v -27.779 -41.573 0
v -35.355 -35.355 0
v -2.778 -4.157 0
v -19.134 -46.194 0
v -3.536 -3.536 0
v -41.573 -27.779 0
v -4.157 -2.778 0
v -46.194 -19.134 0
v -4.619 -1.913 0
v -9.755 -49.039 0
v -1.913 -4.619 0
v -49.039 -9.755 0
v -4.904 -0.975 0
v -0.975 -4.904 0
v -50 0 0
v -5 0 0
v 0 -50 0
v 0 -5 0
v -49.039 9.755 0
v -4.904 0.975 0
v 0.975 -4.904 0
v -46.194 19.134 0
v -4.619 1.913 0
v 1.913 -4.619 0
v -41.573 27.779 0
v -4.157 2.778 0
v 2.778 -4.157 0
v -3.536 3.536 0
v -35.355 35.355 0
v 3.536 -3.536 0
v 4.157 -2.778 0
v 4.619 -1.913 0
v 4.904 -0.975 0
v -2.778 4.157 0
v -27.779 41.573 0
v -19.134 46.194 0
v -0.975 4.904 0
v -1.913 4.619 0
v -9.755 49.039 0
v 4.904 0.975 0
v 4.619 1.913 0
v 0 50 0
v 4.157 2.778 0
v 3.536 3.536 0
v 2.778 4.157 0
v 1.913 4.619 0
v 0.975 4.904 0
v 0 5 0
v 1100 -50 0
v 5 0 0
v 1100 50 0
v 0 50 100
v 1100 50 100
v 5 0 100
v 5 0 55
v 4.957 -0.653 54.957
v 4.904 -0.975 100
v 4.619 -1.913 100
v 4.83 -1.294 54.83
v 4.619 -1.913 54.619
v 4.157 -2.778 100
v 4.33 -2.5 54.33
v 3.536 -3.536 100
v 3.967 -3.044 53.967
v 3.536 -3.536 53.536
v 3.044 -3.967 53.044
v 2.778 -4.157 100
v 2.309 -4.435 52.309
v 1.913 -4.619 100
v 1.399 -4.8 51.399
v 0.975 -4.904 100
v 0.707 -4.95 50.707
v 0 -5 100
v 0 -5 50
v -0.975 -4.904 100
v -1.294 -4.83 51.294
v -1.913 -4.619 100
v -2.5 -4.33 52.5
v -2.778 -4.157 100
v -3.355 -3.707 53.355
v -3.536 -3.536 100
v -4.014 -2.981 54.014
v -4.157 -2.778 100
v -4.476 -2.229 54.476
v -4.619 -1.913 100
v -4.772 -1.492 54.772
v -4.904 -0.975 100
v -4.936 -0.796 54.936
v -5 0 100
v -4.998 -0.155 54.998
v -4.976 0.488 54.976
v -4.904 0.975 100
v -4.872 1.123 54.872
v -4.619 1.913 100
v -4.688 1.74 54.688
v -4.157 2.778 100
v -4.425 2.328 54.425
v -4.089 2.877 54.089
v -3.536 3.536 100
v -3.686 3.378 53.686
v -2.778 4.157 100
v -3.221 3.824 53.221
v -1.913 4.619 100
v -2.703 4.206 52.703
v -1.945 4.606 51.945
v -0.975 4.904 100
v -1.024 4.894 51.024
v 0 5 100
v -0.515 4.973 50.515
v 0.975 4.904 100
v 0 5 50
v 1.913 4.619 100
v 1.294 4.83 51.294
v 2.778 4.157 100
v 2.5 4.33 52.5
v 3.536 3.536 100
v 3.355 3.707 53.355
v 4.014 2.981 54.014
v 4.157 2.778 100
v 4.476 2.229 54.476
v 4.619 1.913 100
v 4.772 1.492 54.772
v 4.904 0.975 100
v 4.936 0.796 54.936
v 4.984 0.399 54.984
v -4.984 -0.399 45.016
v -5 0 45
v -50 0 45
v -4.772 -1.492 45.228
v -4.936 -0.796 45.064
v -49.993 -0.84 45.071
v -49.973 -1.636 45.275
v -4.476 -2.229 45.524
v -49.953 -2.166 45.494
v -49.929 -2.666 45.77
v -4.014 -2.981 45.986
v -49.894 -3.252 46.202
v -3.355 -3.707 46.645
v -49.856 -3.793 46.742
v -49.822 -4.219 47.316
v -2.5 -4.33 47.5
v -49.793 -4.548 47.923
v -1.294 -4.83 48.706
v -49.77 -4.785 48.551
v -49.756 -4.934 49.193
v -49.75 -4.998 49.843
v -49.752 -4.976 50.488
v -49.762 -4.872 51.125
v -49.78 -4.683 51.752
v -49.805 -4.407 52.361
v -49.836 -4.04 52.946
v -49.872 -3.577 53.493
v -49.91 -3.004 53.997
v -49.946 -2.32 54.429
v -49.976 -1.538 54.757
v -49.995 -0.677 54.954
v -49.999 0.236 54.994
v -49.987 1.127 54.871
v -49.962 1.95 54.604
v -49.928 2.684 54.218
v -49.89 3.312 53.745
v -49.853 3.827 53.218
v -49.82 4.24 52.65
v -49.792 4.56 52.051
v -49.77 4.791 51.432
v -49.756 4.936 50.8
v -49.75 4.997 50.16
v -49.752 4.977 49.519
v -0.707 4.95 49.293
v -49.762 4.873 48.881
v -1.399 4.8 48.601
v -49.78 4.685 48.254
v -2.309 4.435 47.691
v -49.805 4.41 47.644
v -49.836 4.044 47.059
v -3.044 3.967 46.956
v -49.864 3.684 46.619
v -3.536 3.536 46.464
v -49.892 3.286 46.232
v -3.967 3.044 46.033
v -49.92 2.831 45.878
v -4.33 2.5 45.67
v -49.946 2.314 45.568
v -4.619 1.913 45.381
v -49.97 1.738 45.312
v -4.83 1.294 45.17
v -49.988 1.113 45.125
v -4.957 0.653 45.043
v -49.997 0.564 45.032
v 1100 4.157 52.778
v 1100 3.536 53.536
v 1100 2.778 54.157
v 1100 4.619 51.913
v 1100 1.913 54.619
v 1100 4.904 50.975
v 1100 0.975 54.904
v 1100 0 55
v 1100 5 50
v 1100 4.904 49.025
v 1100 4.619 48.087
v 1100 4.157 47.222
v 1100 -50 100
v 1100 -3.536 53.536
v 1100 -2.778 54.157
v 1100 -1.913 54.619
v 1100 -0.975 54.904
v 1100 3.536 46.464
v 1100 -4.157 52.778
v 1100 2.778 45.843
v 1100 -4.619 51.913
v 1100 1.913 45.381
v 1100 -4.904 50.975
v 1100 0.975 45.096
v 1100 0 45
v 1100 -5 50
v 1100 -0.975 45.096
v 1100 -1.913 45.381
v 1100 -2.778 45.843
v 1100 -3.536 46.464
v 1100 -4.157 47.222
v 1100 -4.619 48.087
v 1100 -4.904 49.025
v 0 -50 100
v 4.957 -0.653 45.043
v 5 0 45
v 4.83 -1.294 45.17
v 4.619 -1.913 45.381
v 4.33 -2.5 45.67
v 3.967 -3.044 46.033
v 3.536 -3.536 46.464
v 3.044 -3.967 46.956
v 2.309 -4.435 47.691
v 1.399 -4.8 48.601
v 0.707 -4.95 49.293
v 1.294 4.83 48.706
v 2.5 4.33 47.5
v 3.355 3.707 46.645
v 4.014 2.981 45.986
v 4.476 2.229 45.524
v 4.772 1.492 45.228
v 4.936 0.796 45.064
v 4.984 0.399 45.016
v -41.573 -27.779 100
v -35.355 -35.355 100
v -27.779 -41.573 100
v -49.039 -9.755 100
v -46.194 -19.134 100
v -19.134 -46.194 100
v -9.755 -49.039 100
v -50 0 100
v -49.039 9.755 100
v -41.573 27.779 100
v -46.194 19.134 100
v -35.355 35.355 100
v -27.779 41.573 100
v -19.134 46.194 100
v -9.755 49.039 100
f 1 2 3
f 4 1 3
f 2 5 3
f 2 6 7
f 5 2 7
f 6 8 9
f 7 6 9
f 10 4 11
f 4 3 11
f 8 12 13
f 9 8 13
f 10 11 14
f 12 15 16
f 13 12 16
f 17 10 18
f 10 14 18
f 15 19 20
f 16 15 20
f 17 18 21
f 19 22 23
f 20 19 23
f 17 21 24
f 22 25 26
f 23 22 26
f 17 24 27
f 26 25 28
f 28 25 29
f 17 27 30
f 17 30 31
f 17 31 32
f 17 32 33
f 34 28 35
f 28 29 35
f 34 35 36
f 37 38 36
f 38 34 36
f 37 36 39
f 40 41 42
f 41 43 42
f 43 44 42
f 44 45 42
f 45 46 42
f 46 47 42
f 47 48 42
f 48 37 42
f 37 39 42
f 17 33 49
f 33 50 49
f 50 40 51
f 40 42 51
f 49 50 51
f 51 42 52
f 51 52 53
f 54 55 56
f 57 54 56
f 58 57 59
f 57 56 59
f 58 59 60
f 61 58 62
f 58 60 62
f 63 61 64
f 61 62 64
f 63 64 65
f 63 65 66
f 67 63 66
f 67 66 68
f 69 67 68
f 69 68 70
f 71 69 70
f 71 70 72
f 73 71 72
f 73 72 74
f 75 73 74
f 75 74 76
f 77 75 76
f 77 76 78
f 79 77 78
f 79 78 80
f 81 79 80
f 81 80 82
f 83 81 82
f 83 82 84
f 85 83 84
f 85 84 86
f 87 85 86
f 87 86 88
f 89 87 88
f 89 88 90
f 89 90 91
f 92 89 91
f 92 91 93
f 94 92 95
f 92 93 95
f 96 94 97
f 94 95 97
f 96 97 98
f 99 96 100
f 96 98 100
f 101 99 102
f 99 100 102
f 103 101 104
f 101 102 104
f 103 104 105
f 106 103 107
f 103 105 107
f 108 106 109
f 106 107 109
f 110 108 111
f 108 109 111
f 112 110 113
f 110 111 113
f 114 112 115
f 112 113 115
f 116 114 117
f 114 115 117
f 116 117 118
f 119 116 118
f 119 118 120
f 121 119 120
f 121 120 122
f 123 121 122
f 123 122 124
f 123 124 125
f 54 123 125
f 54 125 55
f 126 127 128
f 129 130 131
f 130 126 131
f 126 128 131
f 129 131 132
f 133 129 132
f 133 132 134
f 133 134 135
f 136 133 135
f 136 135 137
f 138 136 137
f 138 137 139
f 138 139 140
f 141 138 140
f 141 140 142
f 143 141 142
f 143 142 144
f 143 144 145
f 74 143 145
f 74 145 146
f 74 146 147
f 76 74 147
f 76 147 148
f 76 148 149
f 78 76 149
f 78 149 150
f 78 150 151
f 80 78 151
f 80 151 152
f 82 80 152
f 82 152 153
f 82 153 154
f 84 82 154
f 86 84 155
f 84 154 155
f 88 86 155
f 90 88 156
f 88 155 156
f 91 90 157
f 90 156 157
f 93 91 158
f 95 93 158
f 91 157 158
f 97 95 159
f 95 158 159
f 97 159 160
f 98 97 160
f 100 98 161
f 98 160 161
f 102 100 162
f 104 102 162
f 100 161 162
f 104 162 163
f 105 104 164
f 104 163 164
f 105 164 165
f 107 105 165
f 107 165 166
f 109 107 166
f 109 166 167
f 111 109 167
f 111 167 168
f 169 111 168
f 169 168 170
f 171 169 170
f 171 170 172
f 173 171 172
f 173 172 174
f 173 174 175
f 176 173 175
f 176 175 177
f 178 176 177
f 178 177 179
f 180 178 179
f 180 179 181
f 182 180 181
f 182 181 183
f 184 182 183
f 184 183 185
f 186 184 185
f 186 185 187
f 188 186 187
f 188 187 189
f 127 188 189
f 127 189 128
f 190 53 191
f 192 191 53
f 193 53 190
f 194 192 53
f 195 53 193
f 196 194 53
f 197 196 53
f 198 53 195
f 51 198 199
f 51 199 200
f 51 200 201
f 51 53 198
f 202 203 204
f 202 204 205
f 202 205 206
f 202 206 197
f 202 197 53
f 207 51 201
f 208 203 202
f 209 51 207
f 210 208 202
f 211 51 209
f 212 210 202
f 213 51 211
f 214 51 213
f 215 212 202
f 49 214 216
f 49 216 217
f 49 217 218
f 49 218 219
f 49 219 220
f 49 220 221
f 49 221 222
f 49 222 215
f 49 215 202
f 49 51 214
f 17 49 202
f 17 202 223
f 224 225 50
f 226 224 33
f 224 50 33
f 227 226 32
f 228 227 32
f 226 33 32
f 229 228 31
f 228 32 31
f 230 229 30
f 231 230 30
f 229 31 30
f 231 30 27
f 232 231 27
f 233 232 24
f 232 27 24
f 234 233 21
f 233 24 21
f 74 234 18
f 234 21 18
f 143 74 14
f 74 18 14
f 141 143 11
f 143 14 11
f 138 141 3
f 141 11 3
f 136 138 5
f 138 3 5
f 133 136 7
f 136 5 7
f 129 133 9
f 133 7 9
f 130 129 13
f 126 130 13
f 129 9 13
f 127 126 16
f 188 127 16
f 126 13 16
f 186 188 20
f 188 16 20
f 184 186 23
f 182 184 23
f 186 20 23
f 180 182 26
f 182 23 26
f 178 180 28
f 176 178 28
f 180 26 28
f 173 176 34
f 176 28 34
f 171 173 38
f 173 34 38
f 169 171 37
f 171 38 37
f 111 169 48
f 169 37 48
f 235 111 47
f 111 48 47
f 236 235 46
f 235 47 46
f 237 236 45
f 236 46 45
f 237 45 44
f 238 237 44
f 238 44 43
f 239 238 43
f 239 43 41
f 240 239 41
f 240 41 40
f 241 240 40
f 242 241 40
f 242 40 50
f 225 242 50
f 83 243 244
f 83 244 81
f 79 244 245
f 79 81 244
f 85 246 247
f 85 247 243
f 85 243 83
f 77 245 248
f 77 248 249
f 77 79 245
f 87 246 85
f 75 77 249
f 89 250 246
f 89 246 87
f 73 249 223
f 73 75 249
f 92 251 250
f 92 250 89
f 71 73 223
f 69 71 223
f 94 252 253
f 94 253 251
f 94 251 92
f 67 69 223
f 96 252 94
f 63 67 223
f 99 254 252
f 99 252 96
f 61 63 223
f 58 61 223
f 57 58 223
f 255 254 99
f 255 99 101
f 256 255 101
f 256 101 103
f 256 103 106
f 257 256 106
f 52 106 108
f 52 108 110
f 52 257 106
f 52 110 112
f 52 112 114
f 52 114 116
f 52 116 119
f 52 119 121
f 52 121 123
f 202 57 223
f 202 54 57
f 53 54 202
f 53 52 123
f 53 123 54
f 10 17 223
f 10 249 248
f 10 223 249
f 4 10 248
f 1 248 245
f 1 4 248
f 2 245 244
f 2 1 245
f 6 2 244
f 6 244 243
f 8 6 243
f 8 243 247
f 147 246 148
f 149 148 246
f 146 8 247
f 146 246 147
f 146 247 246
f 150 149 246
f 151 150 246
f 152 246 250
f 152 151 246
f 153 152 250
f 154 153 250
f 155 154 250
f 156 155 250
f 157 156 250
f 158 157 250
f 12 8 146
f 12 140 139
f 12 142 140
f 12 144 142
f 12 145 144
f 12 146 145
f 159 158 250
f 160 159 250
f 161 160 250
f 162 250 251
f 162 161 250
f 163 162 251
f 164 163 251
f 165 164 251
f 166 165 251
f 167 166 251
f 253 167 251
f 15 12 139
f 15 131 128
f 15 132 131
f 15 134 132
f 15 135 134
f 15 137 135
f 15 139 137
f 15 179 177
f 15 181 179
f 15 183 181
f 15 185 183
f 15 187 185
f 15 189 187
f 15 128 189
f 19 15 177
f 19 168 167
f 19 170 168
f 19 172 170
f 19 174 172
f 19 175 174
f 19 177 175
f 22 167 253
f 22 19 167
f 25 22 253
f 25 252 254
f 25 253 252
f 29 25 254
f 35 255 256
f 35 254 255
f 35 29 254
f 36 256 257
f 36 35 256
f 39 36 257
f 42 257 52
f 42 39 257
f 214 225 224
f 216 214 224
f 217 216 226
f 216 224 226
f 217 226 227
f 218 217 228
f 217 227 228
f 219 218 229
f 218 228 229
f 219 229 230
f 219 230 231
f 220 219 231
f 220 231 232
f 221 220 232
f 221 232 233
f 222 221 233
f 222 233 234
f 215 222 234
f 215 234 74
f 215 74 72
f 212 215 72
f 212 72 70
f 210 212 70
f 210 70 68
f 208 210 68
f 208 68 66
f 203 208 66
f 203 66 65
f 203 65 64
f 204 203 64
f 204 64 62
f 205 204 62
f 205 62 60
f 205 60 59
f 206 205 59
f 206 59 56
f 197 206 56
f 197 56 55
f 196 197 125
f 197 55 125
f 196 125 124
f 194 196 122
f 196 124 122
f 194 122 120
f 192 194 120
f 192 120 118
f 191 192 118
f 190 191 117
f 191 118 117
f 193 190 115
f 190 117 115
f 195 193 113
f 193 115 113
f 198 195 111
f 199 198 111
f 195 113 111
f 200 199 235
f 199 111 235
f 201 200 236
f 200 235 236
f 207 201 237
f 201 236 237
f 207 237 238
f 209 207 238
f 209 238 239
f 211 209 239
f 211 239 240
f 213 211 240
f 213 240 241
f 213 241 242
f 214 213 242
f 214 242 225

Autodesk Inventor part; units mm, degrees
ref_plane "YZ Plane" through (0, 0, 0) normal (1, 0, 0) x (0, 1, 0)
ref_plane "XZ Plane" through (0, 0, 0) normal (0, 1, 0) x (-1, 0, 0)
ref_plane "XY Plane" through (0, 0, 0) normal (0, 0, 1) x (1, 0, 0)
sketch "Sketch1" plane through (0, 0, 0) normal (0, 0, 1) x (1, 0, 0)
  circle A0 centre (0, 0) radius 5
  arc A1 (0, 50) -> (0, -50) centre (0, 0) ccw
  line L0 (0, 50) -> (1100, 50)
  line L1 (1100, 50) -> (1100, -50)
  line L2 (1100, -50) -> (0, -50)
  line L3 (0, -50) -> (0, 5)
  dimension "d0" = 10
  dimension "d1" = 100
  dimension "d2" = 1100
extrude "Extrusion1" add sketch "Sketch1" along normal blind 100
sketch "Sketch2" plane through (1100, -50, 0) normal (1, 0, 0) x (0, 0, -1)
  circle A0 centre (-50, 50) radius 5
  line L0 (0, 0) -> (0, 100) projected
  line L1 (0, 0) -> (-100, 0) projected
  line L2 (-100, 0) -> (-100, 100) projected
  point P0 (0, 50)
  point P1 (0, 50)
  dimension "d5" = 10
  dimension "d6" = 50
  dimension "d7" = 50
  dimension "d8" = 100
hole "Hole1" at (1100, 0, 50) direction (-1, 0, 0) diameter 10 end through all
equation "\"d6\" = 0.5 * d8"
equation "\"d7\" = d6"
properties part number "link3"
